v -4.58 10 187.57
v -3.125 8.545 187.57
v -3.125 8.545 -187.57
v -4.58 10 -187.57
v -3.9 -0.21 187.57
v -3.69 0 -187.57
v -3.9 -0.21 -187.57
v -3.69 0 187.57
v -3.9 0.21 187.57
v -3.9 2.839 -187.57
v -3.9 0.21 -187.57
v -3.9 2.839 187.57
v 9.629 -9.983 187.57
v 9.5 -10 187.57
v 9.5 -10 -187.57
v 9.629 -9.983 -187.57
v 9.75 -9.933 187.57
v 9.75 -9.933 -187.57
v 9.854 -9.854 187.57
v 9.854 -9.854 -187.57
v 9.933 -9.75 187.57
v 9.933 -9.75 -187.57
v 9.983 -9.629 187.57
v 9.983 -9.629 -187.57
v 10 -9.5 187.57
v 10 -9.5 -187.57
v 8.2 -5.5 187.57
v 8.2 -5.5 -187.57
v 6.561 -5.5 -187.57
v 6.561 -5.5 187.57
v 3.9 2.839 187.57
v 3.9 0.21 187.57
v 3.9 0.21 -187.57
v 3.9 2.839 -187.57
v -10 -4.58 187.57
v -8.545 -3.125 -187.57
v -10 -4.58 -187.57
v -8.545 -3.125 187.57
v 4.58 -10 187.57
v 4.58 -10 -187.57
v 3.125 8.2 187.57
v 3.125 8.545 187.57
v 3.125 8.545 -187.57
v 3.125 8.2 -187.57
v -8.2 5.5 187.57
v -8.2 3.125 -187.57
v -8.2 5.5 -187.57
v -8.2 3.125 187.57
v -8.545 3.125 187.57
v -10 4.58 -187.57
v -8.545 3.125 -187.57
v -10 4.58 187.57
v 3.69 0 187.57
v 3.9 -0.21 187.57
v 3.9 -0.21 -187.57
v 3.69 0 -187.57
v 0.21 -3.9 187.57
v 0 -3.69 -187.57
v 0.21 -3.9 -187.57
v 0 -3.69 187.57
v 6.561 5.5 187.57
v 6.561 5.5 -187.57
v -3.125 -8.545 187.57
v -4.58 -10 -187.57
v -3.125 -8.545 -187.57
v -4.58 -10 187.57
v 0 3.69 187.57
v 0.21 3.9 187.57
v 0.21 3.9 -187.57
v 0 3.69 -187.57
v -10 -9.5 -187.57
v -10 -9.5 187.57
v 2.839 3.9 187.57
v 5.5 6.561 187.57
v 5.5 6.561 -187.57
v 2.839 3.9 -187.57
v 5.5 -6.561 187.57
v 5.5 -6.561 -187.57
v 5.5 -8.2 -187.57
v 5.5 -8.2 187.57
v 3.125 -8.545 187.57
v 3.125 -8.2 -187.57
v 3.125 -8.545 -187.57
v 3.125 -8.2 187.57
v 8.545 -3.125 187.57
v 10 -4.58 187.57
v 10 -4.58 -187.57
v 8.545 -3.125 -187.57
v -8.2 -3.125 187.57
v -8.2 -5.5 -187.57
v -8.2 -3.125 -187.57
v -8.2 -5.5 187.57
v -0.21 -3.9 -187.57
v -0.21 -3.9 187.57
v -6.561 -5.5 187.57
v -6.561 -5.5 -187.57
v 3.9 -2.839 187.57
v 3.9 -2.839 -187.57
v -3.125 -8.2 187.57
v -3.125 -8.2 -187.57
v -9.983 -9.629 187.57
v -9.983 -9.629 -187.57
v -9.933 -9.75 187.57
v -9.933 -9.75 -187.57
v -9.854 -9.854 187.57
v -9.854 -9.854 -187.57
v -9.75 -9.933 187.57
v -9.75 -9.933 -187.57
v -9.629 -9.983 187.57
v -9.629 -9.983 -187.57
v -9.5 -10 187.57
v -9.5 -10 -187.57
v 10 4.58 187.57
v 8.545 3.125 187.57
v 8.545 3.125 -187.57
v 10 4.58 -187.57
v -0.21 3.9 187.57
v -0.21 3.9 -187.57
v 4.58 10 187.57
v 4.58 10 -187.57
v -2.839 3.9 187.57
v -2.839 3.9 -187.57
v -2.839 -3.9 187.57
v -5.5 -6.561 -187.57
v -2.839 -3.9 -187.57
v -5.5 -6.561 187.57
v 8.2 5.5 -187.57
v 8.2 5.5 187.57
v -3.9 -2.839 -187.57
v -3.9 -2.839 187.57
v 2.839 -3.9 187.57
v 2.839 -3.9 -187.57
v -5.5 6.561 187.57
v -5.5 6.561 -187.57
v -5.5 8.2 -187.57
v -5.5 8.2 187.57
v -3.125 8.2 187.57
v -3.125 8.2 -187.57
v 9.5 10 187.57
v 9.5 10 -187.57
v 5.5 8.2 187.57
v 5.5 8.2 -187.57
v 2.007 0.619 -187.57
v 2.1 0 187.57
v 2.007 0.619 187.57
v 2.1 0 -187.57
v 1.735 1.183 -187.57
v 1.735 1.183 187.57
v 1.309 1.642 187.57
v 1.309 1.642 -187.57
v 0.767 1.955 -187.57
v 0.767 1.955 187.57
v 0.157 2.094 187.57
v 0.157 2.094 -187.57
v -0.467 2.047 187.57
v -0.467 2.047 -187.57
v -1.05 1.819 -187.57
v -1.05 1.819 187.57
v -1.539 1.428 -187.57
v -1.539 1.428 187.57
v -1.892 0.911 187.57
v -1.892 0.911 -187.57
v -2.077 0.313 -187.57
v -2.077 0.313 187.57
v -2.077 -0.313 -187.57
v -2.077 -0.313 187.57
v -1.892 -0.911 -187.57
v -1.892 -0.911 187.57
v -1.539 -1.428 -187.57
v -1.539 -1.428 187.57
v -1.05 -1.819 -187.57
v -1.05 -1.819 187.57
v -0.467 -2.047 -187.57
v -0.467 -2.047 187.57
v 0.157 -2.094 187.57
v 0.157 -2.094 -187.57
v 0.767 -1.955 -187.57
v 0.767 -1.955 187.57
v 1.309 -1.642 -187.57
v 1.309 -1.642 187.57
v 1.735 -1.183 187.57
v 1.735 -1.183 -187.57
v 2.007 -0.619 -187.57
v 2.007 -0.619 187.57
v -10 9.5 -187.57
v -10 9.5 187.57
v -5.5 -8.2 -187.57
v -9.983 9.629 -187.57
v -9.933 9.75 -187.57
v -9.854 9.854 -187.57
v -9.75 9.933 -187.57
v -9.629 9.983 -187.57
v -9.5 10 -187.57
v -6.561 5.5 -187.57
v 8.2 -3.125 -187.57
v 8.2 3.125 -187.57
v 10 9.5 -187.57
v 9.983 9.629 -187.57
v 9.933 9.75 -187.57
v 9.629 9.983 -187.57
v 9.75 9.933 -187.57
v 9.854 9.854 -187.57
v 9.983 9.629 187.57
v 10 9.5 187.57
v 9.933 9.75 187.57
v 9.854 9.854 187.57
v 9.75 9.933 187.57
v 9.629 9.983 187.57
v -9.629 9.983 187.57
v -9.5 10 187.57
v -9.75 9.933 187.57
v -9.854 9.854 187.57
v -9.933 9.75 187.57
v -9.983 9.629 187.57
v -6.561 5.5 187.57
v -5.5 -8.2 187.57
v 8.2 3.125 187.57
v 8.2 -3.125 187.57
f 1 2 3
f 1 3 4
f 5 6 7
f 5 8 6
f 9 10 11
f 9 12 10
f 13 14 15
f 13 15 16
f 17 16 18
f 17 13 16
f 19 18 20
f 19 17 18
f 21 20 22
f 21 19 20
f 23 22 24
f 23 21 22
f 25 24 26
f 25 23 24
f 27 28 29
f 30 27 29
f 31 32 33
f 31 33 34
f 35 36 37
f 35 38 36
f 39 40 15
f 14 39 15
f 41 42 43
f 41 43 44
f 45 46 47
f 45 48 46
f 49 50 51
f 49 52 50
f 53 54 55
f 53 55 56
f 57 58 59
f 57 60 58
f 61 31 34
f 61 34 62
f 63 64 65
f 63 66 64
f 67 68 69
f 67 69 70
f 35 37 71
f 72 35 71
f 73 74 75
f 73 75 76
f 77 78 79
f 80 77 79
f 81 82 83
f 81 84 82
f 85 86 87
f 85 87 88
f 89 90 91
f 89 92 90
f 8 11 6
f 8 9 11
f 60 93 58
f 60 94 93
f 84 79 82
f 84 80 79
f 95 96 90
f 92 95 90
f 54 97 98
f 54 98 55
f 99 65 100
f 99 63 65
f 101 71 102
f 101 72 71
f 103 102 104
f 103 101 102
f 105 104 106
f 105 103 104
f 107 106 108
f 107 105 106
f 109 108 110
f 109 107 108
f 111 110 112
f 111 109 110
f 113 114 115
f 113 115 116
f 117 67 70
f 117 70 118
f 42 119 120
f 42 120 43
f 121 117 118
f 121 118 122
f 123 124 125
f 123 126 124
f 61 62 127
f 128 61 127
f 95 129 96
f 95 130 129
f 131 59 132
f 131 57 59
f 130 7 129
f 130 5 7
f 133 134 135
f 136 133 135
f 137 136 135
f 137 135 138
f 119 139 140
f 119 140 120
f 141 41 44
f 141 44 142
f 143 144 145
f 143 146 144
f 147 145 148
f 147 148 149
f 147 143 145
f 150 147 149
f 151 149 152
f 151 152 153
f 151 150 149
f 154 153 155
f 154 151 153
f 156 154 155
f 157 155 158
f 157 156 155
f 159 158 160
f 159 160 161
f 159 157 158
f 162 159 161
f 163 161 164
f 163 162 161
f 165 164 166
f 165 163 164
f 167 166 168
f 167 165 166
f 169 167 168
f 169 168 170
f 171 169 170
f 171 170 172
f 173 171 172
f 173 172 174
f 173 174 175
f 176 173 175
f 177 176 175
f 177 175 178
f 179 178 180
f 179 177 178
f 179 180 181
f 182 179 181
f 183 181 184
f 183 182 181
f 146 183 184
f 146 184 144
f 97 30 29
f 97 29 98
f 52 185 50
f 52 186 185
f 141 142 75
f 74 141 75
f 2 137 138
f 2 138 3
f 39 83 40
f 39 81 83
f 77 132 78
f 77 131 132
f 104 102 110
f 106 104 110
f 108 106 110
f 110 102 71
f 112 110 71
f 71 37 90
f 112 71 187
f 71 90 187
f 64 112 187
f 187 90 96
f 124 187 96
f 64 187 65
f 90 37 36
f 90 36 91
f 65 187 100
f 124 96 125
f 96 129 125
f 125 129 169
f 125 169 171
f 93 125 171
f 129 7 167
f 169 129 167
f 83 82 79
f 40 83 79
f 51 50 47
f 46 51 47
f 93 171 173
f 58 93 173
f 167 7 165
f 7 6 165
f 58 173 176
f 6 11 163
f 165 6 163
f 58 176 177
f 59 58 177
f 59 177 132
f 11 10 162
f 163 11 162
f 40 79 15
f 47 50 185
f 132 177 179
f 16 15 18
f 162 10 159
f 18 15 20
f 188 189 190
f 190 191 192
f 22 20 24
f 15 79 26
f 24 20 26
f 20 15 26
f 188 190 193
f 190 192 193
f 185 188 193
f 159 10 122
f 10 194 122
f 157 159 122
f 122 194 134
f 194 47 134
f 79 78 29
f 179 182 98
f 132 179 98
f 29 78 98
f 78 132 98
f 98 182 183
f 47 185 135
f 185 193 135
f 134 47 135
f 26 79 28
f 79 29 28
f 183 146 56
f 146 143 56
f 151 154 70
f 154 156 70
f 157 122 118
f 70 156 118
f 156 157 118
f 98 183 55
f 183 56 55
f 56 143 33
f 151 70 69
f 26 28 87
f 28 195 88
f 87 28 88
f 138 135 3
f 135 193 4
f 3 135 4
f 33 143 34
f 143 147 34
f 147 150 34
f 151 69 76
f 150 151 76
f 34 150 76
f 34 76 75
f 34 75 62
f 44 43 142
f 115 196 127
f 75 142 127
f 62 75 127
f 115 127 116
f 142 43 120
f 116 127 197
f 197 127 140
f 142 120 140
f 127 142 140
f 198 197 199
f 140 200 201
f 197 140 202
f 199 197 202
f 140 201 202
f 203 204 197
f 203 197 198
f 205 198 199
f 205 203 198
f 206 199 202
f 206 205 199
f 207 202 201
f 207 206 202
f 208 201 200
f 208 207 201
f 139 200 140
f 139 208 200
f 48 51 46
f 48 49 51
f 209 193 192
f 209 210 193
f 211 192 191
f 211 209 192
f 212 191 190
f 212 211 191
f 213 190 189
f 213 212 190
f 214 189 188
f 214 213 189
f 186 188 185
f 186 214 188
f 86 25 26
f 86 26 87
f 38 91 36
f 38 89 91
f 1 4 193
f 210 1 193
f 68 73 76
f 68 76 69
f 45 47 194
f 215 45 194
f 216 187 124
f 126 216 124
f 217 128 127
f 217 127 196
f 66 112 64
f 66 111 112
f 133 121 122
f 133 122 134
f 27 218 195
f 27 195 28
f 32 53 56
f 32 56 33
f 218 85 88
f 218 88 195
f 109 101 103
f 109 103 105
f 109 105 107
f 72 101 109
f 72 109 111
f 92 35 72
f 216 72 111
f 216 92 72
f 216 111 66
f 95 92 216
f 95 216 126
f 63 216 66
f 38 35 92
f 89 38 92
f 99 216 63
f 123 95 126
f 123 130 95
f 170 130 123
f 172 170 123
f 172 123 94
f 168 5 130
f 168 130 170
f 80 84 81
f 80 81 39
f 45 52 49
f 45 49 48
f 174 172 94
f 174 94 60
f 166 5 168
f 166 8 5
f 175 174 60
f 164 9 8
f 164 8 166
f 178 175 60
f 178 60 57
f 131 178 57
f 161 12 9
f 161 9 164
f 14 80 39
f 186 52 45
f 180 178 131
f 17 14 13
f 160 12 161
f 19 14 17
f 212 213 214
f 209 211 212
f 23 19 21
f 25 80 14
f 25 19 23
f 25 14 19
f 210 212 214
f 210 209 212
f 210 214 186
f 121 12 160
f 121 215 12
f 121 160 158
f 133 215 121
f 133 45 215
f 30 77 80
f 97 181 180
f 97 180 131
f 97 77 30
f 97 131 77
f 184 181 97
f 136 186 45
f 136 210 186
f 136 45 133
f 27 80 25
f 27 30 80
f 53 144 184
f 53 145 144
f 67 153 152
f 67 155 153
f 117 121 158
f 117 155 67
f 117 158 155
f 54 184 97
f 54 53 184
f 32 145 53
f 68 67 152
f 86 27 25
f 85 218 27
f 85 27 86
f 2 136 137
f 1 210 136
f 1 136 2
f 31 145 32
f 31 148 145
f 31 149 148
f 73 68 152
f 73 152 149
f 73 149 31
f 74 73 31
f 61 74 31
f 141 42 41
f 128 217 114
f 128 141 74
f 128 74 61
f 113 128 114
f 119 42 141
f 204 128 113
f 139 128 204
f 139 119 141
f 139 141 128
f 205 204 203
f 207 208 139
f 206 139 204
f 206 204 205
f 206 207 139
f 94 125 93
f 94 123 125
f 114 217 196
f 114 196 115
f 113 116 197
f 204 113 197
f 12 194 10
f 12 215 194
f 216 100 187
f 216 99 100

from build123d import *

# Parameters (mm, degrees)
SKETCH1_R           = 2.1
BOSS_EXTRUDE1_DEPTH = 187.57


with BuildPart() as part:
    # Sketch1 → Boss-Extrude1 (new body, symmetric)
    with BuildSketch(Plane.XY):
        with BuildLine():
            Line((4.58, -10), (9.5, -10))
            ThreePointArc((9.5, -10), (9.853553391, -9.853553391), (10, -9.5))
            Line((10, -9.5), (10, -4.58))
            Line((10, -4.58), (8.545, -3.125))
            Line((8.545, -3.125), (8.2, -3.125))
            Line((8.2, -3.125), (8.2, -5.5))
            Line((8.2, -5.5), (6.560660172, -5.5))
            Line((6.560660172, -5.5), (3.9, -2.839339828))
            Line((3.9, -2.839339828), (3.9, -0.21))
            Line((3.9, -0.21), (3.69, 0))
            Line((3.69, 0), (3.9, 0.21))
            Line((3.9, 0.21), (3.9, 2.839339828))
            Line((3.9, 2.839339828), (6.560660172, 5.5))
            Line((6.560660172, 5.5), (8.2, 5.5))
            Line((8.2, 5.5), (8.2, 3.125))
            Line((8.2, 3.125), (8.545, 3.125))
            Line((8.545, 3.125), (10, 4.58))
            Line((10, 4.58), (10, 9.5))
            ThreePointArc((10, 9.5), (9.853553391, 9.853553391), (9.5, 10))
            Line((9.5, 10), (4.58, 10))
            Line((4.58, 10), (3.125, 8.545))
            Line((3.125, 8.545), (3.125, 8.2))
            Line((3.125, 8.2), (5.5, 8.2))
            Line((5.5, 8.2), (5.5, 6.560660172))
            Line((5.5, 6.560660172), (2.839339828, 3.9))
            Line((2.839339828, 3.9), (0.21, 3.9))
            Line((0.21, 3.9), (0, 3.69))
            Line((0, 3.69), (-0.21, 3.9))
            Line((-0.21, 3.9), (-2.839339828, 3.9))
            Line((-2.839339828, 3.9), (-5.5, 6.560660172))
            Line((-5.5, 6.560660172), (-5.5, 8.2))
            Line((-5.5, 8.2), (-3.125, 8.2))
            Line((-3.125, 8.2), (-3.125, 8.545))
            Line((-3.125, 8.545), (-4.58, 10))
            Line((-4.58, 10), (-9.5, 10))
            ThreePointArc((-9.5, 10), (-9.853553391, 9.853553391), (-10, 9.5))
            Line((-10, 9.5), (-10, 4.58))
            Line((-10, 4.58), (-8.545, 3.125))
            Line((-8.545, 3.125), (-8.2, 3.125))
            Line((-8.2, 3.125), (-8.2, 5.5))
            Line((-8.2, 5.5), (-6.560660172, 5.5))
            Line((-6.560660172, 5.5), (-3.9, 2.839339828))
            Line((-3.9, 2.839339828), (-3.9, 0.21))
            Line((-3.9, 0.21), (-3.69, 0))
            Line((-3.69, 0), (-3.9, -0.21))
            Line((-3.9, -0.21), (-3.9, -2.839339828))
            Line((-3.9, -2.839339828), (-6.560660172, -5.5))
            Line((-6.560660172, -5.5), (-8.2, -5.5))
            Line((-8.2, -5.5), (-8.2, -3.125))
            Line((-8.2, -3.125), (-8.545, -3.125))
            Line((-8.545, -3.125), (-10, -4.58))
            Line((-10, -4.58), (-10, -9.5))
            ThreePointArc((-10, -9.5), (-9.853553391, -9.853553391), (-9.5, -10))
            Line((-9.5, -10), (-4.58, -10))
            Line((-4.58, -10), (-3.125, -8.545))
            Line((-3.125, -8.545), (-3.125, -8.2))
            Line((-3.125, -8.2), (-5.5, -8.2))
            Line((-5.5, -8.2), (-5.5, -6.560660172))
            Line((-5.5, -6.560660172), (-2.839339828, -3.9))
            Line((-2.839339828, -3.9), (-0.21, -3.9))
            Line((-0.21, -3.9), (0, -3.69))
            Line((0, -3.69), (0.21, -3.9))
            Line((0.21, -3.9), (2.839339828, -3.9))
            Line((2.839339828, -3.9), (5.5, -6.560660172))
            Line((5.5, -6.560660172), (5.5, -8.2))
            Line((5.5, -8.2), (3.125, -8.2))
            Line((3.125, -8.2), (3.125, -8.545))
            Line((3.125, -8.545), (4.58, -10))
        make_face()
        Circle(SKETCH1_R, mode=Mode.SUBTRACT)
    extrude(amount=BOSS_EXTRUDE1_DEPTH, both=True)


solid = part.part
